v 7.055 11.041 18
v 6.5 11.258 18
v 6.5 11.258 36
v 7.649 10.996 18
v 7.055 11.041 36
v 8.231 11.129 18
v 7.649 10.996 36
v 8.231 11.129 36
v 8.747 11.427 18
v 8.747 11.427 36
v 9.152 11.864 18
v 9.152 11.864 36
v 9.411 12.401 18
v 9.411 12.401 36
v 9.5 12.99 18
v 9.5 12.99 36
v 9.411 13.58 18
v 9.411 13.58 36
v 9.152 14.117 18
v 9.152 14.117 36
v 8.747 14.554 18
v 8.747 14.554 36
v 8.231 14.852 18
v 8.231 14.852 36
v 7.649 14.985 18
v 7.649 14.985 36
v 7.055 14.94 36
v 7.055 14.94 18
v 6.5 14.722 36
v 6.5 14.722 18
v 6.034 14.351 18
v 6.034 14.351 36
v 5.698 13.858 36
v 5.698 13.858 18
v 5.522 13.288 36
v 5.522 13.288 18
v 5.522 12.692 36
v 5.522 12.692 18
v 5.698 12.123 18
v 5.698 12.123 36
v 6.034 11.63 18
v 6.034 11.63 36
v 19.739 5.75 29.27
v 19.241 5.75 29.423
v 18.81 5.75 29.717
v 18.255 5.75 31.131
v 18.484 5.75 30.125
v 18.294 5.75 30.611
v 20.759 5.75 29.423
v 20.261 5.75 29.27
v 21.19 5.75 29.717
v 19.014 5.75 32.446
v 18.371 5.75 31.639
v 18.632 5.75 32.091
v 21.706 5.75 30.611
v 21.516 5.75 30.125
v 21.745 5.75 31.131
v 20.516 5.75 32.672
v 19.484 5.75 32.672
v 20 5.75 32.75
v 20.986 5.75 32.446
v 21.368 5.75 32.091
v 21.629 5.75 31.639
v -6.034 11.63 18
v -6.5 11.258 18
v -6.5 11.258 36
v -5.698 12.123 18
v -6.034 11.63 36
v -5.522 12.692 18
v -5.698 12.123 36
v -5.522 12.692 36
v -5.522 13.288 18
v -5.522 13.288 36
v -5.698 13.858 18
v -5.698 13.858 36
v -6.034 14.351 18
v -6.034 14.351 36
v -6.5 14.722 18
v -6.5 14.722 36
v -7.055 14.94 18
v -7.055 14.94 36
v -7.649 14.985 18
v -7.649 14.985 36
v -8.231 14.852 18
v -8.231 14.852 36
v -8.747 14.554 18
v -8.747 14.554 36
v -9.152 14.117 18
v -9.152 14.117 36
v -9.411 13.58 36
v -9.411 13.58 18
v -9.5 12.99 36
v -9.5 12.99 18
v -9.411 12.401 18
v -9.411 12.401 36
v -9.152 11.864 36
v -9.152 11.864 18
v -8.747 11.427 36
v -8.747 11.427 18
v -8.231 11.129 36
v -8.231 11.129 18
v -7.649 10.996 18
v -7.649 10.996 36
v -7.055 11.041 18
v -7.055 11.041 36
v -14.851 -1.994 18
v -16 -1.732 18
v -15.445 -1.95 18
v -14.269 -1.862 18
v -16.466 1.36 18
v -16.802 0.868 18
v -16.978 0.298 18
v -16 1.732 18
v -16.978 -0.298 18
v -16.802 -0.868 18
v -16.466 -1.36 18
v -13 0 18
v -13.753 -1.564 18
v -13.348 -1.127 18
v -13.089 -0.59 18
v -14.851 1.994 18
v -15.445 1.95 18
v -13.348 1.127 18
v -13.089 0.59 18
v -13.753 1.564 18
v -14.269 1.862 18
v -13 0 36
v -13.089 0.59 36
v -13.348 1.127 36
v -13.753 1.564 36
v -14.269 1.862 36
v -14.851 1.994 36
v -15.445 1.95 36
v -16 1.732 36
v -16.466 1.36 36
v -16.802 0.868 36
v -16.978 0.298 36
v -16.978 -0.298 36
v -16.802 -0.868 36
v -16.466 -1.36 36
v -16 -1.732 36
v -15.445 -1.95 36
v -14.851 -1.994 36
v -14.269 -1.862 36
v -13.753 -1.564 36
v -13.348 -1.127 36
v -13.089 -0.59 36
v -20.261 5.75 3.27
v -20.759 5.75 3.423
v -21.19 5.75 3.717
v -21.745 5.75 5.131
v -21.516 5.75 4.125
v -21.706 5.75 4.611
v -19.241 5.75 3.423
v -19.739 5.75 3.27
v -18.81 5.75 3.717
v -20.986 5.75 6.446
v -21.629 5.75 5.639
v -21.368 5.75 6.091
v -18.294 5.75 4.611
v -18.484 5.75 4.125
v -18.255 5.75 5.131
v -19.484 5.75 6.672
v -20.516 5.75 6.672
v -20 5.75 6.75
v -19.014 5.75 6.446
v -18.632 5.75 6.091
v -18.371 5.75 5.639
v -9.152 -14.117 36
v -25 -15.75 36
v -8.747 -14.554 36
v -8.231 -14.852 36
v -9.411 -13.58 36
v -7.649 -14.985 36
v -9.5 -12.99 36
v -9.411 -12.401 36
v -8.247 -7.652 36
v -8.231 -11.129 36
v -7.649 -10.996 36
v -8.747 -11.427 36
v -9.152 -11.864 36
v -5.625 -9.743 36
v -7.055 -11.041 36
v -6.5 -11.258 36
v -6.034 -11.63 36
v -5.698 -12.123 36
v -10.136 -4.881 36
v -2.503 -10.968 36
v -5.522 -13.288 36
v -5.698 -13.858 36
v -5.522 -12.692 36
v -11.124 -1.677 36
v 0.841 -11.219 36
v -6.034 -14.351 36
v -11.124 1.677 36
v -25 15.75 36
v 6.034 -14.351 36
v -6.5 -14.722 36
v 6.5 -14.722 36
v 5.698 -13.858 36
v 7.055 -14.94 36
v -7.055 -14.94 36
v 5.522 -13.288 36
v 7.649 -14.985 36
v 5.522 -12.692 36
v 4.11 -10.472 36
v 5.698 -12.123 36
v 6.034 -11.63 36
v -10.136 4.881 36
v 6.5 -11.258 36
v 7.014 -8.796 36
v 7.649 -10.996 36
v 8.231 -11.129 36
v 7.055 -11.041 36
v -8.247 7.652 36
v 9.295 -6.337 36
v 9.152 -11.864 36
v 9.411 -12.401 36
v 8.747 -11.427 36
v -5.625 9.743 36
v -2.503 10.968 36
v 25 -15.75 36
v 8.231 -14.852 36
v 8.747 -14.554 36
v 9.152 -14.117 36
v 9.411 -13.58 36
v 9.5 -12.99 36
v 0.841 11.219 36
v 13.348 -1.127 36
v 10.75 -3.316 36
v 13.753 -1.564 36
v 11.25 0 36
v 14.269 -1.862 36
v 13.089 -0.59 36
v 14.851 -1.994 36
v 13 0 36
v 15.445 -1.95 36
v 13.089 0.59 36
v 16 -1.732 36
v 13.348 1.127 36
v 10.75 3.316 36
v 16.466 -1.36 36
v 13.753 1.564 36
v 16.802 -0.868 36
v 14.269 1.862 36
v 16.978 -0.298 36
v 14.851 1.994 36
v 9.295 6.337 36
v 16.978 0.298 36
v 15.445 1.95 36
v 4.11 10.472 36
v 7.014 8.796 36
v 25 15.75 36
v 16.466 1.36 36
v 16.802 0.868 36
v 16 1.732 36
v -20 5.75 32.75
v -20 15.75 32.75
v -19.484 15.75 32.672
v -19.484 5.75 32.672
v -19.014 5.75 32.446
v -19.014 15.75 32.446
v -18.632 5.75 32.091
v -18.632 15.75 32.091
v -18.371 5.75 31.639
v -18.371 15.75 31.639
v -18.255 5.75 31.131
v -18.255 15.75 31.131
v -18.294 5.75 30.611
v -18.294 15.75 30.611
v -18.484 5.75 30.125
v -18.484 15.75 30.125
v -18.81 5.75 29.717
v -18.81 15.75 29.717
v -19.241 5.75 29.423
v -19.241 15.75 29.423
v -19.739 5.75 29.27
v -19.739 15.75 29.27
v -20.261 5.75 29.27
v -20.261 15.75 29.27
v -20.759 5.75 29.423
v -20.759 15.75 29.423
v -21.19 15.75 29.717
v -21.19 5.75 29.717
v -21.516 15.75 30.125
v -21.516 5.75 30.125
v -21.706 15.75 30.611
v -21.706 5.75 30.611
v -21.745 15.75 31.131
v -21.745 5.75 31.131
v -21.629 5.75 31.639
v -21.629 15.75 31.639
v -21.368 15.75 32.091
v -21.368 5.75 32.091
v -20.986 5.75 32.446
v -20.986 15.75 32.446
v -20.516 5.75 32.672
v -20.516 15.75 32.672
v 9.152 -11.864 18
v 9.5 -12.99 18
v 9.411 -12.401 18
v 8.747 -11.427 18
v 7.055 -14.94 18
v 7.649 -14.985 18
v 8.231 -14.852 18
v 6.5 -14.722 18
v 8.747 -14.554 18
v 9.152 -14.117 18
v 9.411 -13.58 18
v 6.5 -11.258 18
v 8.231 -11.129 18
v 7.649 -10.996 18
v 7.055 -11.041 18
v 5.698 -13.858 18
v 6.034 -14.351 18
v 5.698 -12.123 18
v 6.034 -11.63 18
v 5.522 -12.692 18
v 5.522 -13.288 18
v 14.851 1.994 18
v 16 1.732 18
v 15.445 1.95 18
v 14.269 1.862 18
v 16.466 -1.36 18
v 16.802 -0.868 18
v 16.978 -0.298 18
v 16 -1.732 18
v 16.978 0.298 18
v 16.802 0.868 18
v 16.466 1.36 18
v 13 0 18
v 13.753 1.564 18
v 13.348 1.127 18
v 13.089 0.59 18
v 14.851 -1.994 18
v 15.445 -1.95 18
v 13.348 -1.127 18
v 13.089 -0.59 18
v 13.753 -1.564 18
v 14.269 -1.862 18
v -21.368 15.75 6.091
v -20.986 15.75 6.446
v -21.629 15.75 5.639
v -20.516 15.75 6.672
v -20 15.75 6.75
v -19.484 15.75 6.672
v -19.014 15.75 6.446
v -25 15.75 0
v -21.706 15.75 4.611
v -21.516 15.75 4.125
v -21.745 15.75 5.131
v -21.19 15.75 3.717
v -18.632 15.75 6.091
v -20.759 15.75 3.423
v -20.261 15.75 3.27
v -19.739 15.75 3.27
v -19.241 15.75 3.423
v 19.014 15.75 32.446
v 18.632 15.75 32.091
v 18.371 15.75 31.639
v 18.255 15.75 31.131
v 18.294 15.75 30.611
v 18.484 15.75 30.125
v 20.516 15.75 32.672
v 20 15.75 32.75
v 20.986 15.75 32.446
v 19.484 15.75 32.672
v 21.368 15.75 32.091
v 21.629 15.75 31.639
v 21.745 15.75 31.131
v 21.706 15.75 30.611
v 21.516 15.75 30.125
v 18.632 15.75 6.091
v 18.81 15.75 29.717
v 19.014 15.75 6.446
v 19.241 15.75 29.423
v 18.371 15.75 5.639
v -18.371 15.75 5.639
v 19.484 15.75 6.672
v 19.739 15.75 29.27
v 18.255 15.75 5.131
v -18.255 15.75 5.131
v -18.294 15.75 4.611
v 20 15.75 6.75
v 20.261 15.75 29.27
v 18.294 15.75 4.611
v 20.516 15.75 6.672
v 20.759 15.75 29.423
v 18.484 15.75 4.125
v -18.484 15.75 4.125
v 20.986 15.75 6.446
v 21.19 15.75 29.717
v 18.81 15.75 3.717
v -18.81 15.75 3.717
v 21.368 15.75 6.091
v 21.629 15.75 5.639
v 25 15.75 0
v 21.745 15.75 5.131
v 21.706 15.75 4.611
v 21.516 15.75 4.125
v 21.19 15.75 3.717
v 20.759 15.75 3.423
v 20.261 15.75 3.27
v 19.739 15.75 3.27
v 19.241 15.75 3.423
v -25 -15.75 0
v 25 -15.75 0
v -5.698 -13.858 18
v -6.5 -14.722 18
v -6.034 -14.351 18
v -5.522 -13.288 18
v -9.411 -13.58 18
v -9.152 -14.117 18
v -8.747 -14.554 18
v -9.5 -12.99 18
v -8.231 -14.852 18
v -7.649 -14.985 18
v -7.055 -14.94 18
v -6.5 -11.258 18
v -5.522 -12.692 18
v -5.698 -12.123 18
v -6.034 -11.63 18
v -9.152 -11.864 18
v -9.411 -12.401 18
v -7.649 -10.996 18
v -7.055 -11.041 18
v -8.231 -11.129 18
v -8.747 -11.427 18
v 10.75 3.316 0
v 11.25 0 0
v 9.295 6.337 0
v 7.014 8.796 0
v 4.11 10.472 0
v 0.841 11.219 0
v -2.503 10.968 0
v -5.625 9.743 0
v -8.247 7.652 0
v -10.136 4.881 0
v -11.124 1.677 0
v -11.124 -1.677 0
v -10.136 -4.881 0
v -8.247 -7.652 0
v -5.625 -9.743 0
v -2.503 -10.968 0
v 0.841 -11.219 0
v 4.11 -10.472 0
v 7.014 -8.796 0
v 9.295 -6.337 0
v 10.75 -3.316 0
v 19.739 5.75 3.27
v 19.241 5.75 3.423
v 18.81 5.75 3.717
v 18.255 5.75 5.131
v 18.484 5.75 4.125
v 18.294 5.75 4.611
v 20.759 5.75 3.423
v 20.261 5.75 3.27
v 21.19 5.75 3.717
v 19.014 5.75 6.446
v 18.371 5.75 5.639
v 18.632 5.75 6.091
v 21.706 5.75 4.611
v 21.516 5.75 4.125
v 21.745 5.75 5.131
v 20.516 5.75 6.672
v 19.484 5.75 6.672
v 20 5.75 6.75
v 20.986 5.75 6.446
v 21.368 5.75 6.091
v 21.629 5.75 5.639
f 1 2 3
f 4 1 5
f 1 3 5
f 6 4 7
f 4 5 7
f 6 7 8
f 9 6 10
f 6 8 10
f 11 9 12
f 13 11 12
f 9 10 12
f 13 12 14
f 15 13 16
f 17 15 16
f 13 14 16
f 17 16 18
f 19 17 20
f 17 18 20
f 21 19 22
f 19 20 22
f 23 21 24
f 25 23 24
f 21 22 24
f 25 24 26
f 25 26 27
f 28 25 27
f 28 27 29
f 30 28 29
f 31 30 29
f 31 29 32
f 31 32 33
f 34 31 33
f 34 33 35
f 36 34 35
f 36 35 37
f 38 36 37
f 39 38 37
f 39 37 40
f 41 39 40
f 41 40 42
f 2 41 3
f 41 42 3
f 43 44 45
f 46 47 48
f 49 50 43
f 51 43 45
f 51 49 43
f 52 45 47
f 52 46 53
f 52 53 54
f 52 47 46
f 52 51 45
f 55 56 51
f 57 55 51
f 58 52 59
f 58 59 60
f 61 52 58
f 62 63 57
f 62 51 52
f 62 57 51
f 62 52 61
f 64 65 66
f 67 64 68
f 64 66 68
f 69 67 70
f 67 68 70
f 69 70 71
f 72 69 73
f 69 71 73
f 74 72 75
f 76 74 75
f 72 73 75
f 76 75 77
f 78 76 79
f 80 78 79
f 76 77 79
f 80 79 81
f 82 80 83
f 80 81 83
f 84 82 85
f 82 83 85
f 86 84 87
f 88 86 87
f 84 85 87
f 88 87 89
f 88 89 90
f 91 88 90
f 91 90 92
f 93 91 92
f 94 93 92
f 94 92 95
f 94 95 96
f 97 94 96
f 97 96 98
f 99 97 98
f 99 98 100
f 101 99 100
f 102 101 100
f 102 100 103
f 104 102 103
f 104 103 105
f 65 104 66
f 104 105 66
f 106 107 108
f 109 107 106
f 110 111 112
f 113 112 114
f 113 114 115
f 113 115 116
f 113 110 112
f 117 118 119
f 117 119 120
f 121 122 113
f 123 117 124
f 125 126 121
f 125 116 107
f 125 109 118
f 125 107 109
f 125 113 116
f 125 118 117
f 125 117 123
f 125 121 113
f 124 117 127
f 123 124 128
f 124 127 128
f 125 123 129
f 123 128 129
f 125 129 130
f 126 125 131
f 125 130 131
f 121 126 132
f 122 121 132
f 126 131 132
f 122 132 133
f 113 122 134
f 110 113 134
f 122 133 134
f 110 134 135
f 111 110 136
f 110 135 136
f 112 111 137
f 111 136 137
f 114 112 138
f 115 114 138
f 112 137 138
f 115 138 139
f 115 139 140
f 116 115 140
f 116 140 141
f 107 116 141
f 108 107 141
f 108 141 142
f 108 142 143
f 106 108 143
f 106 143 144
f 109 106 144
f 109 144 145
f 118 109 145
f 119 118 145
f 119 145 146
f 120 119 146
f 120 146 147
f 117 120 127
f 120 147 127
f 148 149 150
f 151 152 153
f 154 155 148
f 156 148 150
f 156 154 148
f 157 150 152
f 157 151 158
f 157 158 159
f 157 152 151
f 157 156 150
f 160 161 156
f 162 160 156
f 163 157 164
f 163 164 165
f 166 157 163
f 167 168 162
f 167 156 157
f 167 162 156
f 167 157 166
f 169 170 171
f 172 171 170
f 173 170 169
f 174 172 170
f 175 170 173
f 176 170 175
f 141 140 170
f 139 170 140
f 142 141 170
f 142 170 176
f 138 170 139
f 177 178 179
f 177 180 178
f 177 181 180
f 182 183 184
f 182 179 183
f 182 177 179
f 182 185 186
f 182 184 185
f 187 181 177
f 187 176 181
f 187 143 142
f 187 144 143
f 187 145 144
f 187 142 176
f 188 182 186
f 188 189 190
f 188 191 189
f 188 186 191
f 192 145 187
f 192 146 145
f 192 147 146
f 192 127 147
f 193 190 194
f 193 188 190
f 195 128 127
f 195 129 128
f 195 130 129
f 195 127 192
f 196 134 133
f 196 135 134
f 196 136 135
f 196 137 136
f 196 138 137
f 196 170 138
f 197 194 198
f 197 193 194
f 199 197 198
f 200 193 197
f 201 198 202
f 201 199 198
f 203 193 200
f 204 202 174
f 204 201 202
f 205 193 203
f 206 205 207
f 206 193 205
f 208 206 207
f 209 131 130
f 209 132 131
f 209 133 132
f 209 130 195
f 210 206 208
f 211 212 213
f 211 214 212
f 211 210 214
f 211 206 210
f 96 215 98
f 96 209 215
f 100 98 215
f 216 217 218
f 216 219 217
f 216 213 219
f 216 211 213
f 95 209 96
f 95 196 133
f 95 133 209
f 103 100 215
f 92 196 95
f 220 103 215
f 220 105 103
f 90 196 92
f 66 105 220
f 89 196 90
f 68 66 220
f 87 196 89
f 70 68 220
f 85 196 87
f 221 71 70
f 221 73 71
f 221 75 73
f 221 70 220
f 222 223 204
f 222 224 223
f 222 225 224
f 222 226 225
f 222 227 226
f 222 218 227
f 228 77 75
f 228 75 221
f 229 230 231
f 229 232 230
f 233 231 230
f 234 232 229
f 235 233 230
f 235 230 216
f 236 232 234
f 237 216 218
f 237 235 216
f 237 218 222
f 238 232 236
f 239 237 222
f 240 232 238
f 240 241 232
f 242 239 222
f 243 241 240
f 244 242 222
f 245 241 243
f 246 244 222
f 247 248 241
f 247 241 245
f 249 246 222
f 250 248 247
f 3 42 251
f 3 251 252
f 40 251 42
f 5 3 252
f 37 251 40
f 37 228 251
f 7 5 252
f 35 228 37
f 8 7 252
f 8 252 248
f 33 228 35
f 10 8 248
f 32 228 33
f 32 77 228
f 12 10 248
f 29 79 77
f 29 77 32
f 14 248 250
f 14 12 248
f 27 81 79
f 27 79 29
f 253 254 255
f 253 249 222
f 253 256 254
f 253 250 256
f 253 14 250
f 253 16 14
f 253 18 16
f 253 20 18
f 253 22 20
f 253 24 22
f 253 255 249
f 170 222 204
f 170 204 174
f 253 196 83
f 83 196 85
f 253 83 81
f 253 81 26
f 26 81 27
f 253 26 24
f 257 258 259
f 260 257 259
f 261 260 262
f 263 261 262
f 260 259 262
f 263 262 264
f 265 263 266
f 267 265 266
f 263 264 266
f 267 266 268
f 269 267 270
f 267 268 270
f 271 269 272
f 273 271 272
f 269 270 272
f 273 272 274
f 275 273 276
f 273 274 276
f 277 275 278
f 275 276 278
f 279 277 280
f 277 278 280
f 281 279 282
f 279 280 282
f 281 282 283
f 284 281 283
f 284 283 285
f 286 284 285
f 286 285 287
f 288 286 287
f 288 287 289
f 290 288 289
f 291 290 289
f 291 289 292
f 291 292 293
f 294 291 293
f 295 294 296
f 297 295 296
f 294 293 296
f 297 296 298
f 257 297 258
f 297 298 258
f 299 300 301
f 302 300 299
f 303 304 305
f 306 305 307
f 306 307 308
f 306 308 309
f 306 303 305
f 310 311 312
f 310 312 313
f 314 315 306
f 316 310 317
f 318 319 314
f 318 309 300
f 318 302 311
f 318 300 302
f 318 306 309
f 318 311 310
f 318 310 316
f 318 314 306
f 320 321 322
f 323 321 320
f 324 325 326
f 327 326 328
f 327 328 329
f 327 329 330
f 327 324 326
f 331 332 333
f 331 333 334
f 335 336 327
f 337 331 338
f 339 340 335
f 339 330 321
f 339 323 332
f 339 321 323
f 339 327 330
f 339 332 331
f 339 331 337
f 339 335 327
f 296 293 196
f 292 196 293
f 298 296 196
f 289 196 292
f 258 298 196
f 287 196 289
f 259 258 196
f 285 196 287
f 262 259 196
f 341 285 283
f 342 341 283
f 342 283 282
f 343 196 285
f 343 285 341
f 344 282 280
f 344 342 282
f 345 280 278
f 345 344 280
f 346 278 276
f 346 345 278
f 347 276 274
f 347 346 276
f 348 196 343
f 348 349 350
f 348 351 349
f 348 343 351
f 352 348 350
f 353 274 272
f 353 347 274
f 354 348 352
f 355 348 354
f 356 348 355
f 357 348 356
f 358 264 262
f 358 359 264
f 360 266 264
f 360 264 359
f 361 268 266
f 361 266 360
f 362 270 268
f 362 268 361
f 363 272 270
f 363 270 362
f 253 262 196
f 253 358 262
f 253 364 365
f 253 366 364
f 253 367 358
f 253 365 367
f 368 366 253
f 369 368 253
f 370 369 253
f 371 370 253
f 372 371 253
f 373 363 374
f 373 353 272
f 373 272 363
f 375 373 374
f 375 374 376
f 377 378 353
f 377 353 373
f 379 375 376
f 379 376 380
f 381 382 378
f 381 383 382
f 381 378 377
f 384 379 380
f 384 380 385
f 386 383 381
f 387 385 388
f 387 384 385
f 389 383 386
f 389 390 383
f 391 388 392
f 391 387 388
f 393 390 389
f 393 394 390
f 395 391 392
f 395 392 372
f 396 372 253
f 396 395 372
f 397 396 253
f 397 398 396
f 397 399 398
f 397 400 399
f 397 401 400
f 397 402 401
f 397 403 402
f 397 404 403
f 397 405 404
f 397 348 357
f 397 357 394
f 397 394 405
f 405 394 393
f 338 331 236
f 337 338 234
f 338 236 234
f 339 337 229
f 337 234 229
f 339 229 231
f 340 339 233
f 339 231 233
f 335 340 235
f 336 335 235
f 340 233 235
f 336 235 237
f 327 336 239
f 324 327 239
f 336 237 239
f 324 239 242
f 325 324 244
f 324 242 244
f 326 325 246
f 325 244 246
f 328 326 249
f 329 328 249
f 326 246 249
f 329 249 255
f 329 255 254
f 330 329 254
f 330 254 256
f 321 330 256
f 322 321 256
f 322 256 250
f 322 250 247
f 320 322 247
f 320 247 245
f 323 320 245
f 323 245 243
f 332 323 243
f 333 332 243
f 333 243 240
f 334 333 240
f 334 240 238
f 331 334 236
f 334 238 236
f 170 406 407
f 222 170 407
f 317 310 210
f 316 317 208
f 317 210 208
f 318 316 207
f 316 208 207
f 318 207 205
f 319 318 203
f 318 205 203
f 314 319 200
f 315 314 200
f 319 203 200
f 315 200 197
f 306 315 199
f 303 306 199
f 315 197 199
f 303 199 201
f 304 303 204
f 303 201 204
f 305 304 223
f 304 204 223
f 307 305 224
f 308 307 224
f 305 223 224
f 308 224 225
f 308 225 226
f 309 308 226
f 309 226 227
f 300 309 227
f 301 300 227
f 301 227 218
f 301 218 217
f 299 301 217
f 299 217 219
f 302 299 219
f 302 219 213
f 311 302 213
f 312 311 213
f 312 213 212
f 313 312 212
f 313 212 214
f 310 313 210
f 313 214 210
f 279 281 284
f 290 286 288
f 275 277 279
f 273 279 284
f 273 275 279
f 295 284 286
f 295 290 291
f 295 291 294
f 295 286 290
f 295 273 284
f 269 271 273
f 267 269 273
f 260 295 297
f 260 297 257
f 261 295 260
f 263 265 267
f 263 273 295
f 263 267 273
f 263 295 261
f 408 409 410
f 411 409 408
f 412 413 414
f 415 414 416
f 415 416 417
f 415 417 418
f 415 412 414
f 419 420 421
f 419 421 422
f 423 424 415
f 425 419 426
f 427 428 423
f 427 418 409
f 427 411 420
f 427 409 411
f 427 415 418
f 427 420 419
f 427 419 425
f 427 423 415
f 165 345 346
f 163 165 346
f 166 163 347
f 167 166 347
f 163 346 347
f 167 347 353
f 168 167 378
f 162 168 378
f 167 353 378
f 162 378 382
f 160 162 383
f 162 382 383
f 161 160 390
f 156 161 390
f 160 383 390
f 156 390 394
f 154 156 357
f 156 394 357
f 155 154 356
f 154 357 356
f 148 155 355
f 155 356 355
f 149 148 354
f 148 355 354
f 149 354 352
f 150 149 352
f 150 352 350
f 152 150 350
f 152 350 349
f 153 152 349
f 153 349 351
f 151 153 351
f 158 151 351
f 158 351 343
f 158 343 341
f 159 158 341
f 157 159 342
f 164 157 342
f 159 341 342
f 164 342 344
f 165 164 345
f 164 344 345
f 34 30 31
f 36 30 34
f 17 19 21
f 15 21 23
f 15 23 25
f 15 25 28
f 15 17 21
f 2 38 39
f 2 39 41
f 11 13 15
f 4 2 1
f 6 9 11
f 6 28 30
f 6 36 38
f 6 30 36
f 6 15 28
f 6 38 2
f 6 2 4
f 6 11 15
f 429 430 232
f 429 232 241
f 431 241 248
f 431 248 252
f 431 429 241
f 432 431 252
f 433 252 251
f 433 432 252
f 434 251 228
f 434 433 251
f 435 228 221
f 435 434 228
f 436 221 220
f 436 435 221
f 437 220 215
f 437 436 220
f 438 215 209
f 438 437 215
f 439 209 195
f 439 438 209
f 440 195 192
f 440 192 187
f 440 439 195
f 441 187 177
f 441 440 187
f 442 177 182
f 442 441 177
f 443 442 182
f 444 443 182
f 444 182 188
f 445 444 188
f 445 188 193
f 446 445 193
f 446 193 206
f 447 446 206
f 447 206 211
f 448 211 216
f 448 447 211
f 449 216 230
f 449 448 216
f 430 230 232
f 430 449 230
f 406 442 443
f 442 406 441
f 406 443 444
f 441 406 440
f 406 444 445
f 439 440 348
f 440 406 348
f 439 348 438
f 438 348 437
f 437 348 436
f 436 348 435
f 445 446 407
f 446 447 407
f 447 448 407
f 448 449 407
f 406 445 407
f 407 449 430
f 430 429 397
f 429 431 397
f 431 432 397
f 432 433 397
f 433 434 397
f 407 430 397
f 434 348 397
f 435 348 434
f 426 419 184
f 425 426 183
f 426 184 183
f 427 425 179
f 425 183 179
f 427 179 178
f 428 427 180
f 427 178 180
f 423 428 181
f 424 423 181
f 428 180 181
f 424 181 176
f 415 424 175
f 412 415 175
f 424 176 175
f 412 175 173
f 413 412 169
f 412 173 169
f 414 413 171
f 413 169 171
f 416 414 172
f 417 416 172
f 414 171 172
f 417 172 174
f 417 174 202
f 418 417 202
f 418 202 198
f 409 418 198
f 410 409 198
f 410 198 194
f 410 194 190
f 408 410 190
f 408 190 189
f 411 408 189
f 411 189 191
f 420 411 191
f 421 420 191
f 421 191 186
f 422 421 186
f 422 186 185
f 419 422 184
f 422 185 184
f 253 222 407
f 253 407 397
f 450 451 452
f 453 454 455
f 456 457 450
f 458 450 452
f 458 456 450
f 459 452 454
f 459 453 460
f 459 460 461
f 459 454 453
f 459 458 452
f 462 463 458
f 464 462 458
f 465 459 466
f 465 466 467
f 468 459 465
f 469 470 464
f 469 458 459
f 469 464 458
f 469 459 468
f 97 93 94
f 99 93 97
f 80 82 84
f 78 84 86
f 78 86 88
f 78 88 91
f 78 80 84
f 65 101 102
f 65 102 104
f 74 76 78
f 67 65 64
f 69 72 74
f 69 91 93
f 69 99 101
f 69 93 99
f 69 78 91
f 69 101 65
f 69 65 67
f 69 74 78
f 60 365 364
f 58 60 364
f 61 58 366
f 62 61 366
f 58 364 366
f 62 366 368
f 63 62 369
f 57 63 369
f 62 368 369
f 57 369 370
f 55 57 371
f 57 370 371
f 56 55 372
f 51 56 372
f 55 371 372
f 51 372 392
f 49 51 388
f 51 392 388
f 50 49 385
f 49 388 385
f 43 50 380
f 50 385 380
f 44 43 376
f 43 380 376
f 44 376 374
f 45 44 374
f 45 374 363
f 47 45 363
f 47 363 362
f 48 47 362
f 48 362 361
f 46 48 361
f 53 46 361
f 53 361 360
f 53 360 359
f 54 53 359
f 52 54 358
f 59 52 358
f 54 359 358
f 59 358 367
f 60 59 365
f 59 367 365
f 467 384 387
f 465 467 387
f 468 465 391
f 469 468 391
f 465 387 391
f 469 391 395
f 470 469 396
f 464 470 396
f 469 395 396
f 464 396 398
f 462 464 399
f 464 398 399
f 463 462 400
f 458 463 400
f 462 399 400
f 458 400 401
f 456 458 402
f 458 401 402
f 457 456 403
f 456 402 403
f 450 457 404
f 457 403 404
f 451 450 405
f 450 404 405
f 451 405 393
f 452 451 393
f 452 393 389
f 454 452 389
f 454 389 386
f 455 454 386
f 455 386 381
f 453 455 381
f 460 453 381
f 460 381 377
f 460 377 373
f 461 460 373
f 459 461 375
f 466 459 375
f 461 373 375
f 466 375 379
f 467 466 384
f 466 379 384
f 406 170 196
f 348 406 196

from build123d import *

# Parameters (mm, degrees)
CROQUIS1_W              = 50
CROQUIS1_H              = 31.5
CROQUIS1_R              = 11.25
SALIENTE_EXTRUIR1_DEPTH = 36
CROQUIS2_R              = 1.75
CORTAR_EXTRUIR1_DEPTH   = 10
CROQUIS3_R              = 2
CORTAR_EXTRUIR2_DEPTH   = 18
MATRIZC1_COUNT          = 6


with BuildPart() as part:
    # Croquis1 → Saliente-Extruir1 (new body)
    with BuildSketch(Plane.XY):
        Rectangle(CROQUIS1_W, CROQUIS1_H)
        Circle(CROQUIS1_R, mode=Mode.SUBTRACT)
    extrude(amount=SALIENTE_EXTRUIR1_DEPTH)

    # Croquis2 → Cortar-Extruir1 (cut)
    with BuildSketch(Plane(origin=(0, 15.75, 0), x_dir=(1, 0, 0), z_dir=(0, 1, 0))):
        with Locations(Location((-20, -5, 0), (0, 0, 270))):
            Circle(CROQUIS2_R)
        with Locations(Location((20, -5, 0), (0, 0, 270))):
            Circle(CROQUIS2_R)
        with Locations(Location((20, -31, 0), (0, 0, 270))):
            Circle(CROQUIS2_R)
        with Locations(Location((-20, -31, 0), (0, 0, 270))):
            Circle(CROQUIS2_R)
    extrude(amount=-CORTAR_EXTRUIR1_DEPTH, mode=Mode.SUBTRACT)

    # Croquis3 → Cortar-Extruir2 (cut)
    with BuildSketch(Plane.XY.offset(36)):
        with Locations((-15, 0)):
            Circle(CROQUIS3_R)
    cortar_extruir2 = extrude(amount=-CORTAR_EXTRUIR2_DEPTH, mode=Mode.SUBTRACT)

    # MatrizC1: Cortar-Extruir2 ×6 about axis
    matrizc1_axis = Axis((0, 0, 0), (0, 0, 1))
    for i in range(1, MATRIZC1_COUNT):
        add(cortar_extruir2.rotate(matrizc1_axis, i * 360 / MATRIZC1_COUNT), mode=Mode.SUBTRACT)


solid = part.part
